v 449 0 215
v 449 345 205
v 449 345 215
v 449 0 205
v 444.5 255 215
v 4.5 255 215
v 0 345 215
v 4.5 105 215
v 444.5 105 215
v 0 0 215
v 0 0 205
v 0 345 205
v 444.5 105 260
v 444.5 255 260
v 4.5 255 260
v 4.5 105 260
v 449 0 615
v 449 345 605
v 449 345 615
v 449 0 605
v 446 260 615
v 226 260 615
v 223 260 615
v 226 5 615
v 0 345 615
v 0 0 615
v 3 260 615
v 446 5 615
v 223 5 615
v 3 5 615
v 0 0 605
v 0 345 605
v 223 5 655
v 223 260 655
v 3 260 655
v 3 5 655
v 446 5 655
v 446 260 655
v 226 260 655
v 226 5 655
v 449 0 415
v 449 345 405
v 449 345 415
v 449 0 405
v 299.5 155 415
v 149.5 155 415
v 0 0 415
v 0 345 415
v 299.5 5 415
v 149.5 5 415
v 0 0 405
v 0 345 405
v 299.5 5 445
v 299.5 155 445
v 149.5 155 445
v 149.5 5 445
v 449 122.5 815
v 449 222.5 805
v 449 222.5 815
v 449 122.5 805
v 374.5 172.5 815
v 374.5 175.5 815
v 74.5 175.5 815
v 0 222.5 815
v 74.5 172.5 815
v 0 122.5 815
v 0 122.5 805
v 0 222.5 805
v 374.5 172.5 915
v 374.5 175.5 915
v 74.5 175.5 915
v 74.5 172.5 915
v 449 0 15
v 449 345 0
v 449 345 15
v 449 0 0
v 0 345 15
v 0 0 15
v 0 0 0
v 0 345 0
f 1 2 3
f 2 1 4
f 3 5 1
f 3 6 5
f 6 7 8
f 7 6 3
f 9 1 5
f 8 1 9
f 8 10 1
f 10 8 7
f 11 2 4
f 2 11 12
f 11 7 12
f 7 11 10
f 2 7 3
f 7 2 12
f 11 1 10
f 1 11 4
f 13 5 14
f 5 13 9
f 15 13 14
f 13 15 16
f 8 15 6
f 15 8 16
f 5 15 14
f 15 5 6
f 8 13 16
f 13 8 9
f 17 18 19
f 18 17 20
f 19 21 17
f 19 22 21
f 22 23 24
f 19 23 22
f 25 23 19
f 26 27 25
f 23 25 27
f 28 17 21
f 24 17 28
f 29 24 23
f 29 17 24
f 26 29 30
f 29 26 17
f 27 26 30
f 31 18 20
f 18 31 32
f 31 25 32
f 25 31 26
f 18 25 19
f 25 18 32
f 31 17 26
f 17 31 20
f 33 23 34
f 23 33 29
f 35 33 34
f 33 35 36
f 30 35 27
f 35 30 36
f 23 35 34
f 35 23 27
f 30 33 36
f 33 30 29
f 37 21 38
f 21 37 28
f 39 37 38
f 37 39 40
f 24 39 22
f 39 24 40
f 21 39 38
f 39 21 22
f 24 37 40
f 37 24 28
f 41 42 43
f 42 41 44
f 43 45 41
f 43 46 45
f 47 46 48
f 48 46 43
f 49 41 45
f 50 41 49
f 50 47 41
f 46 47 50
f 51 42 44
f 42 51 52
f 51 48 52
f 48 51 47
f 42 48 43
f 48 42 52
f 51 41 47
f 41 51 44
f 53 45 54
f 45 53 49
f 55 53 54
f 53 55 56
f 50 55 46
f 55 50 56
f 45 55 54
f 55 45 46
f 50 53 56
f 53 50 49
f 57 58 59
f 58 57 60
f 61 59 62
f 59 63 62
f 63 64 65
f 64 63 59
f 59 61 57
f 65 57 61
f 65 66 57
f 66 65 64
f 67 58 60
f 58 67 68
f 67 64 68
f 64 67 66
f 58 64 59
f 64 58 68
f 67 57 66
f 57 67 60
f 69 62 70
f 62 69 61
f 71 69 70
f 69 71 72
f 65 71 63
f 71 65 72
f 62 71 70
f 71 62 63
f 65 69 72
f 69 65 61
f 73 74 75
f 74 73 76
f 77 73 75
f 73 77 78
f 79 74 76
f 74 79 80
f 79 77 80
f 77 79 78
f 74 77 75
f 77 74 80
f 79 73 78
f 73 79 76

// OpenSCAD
cabine_height = 190;

cabine_depth = 345;
ant_cabine_depth = 100;

floor_height = 10;
base_floor_height = 15;

rack_hole_spacing_x = 465;
cabine_wall_width = 16;

cabine_width = rack_hole_spacing_x - cabine_wall_width;
echo("cabine_width = ", cabine_width, "mm");
echo("floor_height = ", floor_height, "mm");
echo("wall_width = ", cabine_wall_width, "mm");

//BASE
cube([cabine_width, cabine_depth, base_floor_height]);

//COTOCLOCK
octo_floor_z = cabine_height + base_floor_height;
octo_width = 440;
octo_height = 45;
octo_depth = 150;
octo_y = cabine_depth - octo_depth - 90;
translate([0, 0, octo_floor_z]) {
    octo_spacer_width = (cabine_width - octo_width) / 2;
    cube([cabine_width, cabine_depth, floor_height]);
    translate([octo_spacer_width, octo_y, floor_height]) 
    cube([octo_width, octo_depth, octo_height]);
}

//USRPS
usrp_y = 5;
usrp_floor_z = 3 * cabine_height + 2*floor_height + base_floor_height;
usrp_width = 220;
usrp_height = 40;
usrp_depth = 255;
translate([0, 0, usrp_floor_z]) {
    usrp_spacer_width = (cabine_width - 2 * usrp_width) / 3;
    cube([cabine_width, cabine_depth, floor_height]);
    translate([usrp_spacer_width, usrp_y, floor_height])
    cube([usrp_width, usrp_depth, usrp_height]);
    translate([2*usrp_spacer_width + usrp_width, usrp_y, floor_height])
    cube([usrp_width, usrp_depth, usrp_height]);
}

//SPLITTER
splitter_y = 5;
splitter_floor_z = 2 * cabine_height + floor_height + base_floor_height;
splitter_width = 150;
splitter_height = 30;
translate([0, 0, splitter_floor_z]) {
    splitter_spacer_width = (cabine_width - splitter_width) / 2;
    cube([cabine_width, cabine_depth, floor_height]);
    translate([splitter_spacer_width, splitter_y, floor_height]) 
    cube([splitter_width, splitter_width, splitter_height]);
}

//BASE
base_y = 0;
translate([0, 0, splitter_floor_z]) {
    splitter_spacer_width = (cabine_width - splitter_width) / 2;
    cube([cabine_width, cabine_depth, floor_height]);
    translate([splitter_spacer_width, splitter_y, floor_height]) 
    cube([splitter_width, splitter_width, splitter_height]);
}

//ANTENNA
ant_y = ant_cabine_depth / 2;
ant_floor_z = 4 * cabine_height + base_floor_height + 3 * floor_height;
ant_width = 300;
ant_height = 100;
ant_depth = 3;
translate([0, 0, ant_floor_z]) {
    ant_spacer_width = (cabine_width - ant_width) / 2;
    translate([0, (cabine_depth - ant_cabine_depth) / 2, 0]) {
        cube([cabine_width, ant_cabine_depth, floor_height]);
        translate([ant_spacer_width, ant_y, floor_height]) 
        cube([ant_width, ant_depth, ant_height]);
    }
}
